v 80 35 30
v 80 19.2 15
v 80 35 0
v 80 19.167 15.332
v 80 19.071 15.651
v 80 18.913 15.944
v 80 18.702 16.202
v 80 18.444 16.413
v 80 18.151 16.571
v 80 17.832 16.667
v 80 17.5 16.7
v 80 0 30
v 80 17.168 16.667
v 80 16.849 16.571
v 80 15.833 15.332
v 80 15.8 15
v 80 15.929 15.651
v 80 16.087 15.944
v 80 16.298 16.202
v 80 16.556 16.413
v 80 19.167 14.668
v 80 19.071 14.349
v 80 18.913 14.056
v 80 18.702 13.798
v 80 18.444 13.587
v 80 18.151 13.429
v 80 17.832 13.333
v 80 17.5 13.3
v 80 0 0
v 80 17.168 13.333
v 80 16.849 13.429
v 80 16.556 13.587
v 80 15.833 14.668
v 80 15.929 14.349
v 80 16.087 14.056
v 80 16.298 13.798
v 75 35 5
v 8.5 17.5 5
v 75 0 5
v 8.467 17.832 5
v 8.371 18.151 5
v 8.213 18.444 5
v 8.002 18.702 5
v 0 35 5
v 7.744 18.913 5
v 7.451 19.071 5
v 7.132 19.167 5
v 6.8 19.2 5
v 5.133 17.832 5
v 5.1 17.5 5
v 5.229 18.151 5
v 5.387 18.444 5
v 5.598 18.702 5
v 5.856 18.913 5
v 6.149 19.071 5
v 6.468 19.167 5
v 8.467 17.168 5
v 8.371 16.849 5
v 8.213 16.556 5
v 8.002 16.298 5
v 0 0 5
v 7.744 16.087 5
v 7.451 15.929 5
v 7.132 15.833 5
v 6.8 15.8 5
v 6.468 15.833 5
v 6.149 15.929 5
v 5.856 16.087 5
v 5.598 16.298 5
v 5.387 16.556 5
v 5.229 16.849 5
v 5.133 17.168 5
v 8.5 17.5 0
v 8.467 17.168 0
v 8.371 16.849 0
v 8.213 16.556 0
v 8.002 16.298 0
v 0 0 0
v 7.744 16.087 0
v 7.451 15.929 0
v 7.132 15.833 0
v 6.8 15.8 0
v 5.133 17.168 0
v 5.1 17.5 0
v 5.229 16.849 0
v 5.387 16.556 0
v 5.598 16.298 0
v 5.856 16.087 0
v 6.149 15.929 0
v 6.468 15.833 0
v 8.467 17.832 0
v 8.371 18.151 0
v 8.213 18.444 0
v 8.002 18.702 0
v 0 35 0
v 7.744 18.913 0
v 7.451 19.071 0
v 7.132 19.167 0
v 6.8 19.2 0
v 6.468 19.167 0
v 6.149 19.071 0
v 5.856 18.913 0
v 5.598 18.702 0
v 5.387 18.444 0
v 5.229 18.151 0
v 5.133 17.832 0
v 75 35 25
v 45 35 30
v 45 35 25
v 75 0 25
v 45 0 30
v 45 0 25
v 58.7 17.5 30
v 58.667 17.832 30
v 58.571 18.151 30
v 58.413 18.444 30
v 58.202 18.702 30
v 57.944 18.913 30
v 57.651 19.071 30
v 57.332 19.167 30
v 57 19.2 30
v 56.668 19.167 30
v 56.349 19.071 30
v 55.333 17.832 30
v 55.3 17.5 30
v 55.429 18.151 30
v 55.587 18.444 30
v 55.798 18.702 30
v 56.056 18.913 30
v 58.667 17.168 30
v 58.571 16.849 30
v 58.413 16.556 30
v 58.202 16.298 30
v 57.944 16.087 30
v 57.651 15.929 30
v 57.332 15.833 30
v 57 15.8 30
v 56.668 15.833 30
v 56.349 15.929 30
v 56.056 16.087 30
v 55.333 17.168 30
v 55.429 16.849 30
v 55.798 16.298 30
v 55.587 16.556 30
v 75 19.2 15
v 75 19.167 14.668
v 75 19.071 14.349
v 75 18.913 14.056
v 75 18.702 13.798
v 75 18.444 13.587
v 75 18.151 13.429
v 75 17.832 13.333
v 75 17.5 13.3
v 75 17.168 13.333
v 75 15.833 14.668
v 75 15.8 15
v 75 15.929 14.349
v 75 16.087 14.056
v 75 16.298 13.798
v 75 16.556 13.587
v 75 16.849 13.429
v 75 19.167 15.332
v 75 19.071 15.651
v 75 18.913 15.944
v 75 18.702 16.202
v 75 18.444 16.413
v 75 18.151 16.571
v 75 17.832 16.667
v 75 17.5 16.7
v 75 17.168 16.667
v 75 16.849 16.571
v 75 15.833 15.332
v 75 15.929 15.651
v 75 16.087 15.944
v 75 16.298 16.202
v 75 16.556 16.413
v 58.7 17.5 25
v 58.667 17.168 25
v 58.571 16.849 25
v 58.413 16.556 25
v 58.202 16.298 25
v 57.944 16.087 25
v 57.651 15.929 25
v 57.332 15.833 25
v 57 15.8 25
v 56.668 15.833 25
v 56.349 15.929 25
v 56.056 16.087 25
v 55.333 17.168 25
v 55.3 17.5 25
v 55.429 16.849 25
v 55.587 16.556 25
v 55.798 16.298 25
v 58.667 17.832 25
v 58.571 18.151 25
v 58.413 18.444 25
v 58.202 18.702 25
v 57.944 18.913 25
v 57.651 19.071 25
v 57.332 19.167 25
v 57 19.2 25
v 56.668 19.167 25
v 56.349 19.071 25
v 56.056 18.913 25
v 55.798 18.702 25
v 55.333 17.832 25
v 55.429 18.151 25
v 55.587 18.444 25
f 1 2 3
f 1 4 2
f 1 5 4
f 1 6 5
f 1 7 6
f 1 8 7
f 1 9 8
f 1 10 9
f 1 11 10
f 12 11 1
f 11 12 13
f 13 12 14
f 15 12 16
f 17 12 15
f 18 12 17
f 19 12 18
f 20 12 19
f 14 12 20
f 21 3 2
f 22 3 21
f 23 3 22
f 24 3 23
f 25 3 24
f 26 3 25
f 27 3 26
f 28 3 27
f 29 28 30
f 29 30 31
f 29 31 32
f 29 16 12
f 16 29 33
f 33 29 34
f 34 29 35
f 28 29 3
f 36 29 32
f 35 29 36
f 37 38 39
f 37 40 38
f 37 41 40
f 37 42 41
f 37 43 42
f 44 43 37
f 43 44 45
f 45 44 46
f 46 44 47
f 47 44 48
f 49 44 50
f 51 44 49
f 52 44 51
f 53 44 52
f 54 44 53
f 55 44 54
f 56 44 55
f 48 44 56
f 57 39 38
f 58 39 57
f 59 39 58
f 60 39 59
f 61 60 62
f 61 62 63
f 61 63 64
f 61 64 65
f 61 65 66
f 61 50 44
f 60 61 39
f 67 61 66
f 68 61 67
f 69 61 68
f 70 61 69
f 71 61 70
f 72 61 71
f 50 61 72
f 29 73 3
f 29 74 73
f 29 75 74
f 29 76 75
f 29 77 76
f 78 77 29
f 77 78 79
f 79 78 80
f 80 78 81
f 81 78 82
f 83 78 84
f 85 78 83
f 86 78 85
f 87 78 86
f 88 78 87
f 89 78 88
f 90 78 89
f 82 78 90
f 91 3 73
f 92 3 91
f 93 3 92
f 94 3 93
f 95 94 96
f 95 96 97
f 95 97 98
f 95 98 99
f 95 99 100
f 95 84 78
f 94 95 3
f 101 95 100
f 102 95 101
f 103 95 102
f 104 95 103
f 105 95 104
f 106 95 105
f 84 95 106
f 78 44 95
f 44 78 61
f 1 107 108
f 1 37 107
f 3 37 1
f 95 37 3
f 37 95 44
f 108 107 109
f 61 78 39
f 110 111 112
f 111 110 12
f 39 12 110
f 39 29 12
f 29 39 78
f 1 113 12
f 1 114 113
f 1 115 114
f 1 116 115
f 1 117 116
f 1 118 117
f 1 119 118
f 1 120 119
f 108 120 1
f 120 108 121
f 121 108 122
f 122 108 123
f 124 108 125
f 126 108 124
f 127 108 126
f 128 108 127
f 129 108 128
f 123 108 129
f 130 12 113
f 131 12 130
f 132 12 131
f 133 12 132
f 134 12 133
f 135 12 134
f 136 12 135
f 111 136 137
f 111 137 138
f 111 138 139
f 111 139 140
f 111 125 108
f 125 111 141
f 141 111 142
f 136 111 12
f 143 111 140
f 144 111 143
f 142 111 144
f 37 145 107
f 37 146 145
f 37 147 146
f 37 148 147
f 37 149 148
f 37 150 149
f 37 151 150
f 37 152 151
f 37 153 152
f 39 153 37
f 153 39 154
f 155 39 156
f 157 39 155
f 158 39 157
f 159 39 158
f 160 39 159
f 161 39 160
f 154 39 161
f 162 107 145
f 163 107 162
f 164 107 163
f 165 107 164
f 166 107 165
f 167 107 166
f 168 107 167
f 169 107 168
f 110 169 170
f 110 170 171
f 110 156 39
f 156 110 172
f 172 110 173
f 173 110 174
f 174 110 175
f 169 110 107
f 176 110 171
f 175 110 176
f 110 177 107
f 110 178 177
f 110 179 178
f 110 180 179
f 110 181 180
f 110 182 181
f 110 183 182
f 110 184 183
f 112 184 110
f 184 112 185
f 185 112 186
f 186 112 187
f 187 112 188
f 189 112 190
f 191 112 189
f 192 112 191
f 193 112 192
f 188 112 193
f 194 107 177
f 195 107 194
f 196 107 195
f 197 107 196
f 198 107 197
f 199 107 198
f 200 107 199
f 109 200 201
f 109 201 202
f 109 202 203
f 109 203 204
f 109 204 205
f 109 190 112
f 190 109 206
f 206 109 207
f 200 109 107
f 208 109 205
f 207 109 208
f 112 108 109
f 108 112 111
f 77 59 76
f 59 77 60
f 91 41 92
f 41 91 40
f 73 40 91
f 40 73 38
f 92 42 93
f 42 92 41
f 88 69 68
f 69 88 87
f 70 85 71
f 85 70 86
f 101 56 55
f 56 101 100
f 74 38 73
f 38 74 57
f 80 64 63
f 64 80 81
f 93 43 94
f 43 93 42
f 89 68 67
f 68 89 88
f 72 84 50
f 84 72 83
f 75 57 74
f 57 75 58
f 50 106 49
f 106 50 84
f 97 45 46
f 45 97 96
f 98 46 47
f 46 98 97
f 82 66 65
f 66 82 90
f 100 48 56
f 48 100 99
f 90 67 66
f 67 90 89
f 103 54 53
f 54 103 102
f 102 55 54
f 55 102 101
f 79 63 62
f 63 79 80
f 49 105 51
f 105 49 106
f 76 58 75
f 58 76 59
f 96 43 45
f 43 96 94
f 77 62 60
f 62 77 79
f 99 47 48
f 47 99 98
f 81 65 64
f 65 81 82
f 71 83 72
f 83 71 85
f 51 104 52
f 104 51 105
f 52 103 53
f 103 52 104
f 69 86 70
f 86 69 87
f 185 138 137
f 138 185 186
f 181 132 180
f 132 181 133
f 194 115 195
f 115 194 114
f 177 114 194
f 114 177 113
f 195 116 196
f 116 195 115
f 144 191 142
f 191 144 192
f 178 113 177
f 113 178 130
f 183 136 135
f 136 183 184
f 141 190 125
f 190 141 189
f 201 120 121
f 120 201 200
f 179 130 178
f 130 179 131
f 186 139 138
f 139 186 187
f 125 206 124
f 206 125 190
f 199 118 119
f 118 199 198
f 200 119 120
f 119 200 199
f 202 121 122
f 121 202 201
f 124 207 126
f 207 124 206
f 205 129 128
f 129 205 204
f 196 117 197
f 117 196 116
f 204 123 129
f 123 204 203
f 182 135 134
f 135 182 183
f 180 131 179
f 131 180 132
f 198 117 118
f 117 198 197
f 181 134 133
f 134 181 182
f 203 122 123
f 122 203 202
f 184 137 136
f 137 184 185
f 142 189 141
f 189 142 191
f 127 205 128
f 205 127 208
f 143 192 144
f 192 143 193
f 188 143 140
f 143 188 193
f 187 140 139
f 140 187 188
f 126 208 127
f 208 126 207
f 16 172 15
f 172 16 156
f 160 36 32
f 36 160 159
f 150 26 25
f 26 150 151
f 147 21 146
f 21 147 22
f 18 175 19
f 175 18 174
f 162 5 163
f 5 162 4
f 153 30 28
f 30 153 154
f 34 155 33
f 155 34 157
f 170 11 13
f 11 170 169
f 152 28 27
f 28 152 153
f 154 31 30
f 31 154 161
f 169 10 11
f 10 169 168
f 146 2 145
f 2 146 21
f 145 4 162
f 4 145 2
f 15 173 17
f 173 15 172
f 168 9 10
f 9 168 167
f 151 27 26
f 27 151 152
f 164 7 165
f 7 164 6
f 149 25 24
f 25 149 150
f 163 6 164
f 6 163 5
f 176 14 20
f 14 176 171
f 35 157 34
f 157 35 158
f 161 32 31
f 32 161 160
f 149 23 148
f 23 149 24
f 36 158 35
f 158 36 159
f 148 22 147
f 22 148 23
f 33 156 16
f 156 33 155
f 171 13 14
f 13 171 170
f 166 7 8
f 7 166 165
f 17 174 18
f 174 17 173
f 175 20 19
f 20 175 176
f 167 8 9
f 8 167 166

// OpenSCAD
$fn = 32;

// ----------------------------------------------------------------------
// Z-bracket: 80 x 35 x 30 mm
// ----------------------------------------------------------------------

// --- parameters (mm) ---
foot_len = 80;            // lower foot length, X
top_len = 30;             // upper foot length, X
depth = 35;               // bracket width, Y
step_h = 30;              // overall rise, Z
plate_t = 5;              // plate thickness
hole_d = 3.4;             // clearance for M3

module hole_z(px, py, z0) {
  translate([px, py, z0 - 2.5]) cylinder(h = plate_t + 5, d = hole_d);
}
module hole_x(py, pz) {
  translate([-2.5, py, pz]) rotate([0, 90, 0]) cylinder(h = plate_t + 5, d = hole_d);
}

difference() {
  union() {
    cube([foot_len, depth, plate_t]);
    /* web, overlapping the lower foot */
    translate([foot_len - plate_t, 0, 0]) cube([plate_t, depth, step_h]);
    /* upper foot, sunk into the web */
    translate([foot_len - plate_t - top_len, 0, step_h - plate_t]) cube([top_len + plate_t, depth, plate_t]);
  }
  hole_z(6.8, 17.5, 0);
  translate([foot_len - plate_t - 18, 0, 0]) hole_z(0, 17.5, step_h - plate_t);
  translate([foot_len - plate_t, 0, 0]) hole_x(17.5, 15);
}
